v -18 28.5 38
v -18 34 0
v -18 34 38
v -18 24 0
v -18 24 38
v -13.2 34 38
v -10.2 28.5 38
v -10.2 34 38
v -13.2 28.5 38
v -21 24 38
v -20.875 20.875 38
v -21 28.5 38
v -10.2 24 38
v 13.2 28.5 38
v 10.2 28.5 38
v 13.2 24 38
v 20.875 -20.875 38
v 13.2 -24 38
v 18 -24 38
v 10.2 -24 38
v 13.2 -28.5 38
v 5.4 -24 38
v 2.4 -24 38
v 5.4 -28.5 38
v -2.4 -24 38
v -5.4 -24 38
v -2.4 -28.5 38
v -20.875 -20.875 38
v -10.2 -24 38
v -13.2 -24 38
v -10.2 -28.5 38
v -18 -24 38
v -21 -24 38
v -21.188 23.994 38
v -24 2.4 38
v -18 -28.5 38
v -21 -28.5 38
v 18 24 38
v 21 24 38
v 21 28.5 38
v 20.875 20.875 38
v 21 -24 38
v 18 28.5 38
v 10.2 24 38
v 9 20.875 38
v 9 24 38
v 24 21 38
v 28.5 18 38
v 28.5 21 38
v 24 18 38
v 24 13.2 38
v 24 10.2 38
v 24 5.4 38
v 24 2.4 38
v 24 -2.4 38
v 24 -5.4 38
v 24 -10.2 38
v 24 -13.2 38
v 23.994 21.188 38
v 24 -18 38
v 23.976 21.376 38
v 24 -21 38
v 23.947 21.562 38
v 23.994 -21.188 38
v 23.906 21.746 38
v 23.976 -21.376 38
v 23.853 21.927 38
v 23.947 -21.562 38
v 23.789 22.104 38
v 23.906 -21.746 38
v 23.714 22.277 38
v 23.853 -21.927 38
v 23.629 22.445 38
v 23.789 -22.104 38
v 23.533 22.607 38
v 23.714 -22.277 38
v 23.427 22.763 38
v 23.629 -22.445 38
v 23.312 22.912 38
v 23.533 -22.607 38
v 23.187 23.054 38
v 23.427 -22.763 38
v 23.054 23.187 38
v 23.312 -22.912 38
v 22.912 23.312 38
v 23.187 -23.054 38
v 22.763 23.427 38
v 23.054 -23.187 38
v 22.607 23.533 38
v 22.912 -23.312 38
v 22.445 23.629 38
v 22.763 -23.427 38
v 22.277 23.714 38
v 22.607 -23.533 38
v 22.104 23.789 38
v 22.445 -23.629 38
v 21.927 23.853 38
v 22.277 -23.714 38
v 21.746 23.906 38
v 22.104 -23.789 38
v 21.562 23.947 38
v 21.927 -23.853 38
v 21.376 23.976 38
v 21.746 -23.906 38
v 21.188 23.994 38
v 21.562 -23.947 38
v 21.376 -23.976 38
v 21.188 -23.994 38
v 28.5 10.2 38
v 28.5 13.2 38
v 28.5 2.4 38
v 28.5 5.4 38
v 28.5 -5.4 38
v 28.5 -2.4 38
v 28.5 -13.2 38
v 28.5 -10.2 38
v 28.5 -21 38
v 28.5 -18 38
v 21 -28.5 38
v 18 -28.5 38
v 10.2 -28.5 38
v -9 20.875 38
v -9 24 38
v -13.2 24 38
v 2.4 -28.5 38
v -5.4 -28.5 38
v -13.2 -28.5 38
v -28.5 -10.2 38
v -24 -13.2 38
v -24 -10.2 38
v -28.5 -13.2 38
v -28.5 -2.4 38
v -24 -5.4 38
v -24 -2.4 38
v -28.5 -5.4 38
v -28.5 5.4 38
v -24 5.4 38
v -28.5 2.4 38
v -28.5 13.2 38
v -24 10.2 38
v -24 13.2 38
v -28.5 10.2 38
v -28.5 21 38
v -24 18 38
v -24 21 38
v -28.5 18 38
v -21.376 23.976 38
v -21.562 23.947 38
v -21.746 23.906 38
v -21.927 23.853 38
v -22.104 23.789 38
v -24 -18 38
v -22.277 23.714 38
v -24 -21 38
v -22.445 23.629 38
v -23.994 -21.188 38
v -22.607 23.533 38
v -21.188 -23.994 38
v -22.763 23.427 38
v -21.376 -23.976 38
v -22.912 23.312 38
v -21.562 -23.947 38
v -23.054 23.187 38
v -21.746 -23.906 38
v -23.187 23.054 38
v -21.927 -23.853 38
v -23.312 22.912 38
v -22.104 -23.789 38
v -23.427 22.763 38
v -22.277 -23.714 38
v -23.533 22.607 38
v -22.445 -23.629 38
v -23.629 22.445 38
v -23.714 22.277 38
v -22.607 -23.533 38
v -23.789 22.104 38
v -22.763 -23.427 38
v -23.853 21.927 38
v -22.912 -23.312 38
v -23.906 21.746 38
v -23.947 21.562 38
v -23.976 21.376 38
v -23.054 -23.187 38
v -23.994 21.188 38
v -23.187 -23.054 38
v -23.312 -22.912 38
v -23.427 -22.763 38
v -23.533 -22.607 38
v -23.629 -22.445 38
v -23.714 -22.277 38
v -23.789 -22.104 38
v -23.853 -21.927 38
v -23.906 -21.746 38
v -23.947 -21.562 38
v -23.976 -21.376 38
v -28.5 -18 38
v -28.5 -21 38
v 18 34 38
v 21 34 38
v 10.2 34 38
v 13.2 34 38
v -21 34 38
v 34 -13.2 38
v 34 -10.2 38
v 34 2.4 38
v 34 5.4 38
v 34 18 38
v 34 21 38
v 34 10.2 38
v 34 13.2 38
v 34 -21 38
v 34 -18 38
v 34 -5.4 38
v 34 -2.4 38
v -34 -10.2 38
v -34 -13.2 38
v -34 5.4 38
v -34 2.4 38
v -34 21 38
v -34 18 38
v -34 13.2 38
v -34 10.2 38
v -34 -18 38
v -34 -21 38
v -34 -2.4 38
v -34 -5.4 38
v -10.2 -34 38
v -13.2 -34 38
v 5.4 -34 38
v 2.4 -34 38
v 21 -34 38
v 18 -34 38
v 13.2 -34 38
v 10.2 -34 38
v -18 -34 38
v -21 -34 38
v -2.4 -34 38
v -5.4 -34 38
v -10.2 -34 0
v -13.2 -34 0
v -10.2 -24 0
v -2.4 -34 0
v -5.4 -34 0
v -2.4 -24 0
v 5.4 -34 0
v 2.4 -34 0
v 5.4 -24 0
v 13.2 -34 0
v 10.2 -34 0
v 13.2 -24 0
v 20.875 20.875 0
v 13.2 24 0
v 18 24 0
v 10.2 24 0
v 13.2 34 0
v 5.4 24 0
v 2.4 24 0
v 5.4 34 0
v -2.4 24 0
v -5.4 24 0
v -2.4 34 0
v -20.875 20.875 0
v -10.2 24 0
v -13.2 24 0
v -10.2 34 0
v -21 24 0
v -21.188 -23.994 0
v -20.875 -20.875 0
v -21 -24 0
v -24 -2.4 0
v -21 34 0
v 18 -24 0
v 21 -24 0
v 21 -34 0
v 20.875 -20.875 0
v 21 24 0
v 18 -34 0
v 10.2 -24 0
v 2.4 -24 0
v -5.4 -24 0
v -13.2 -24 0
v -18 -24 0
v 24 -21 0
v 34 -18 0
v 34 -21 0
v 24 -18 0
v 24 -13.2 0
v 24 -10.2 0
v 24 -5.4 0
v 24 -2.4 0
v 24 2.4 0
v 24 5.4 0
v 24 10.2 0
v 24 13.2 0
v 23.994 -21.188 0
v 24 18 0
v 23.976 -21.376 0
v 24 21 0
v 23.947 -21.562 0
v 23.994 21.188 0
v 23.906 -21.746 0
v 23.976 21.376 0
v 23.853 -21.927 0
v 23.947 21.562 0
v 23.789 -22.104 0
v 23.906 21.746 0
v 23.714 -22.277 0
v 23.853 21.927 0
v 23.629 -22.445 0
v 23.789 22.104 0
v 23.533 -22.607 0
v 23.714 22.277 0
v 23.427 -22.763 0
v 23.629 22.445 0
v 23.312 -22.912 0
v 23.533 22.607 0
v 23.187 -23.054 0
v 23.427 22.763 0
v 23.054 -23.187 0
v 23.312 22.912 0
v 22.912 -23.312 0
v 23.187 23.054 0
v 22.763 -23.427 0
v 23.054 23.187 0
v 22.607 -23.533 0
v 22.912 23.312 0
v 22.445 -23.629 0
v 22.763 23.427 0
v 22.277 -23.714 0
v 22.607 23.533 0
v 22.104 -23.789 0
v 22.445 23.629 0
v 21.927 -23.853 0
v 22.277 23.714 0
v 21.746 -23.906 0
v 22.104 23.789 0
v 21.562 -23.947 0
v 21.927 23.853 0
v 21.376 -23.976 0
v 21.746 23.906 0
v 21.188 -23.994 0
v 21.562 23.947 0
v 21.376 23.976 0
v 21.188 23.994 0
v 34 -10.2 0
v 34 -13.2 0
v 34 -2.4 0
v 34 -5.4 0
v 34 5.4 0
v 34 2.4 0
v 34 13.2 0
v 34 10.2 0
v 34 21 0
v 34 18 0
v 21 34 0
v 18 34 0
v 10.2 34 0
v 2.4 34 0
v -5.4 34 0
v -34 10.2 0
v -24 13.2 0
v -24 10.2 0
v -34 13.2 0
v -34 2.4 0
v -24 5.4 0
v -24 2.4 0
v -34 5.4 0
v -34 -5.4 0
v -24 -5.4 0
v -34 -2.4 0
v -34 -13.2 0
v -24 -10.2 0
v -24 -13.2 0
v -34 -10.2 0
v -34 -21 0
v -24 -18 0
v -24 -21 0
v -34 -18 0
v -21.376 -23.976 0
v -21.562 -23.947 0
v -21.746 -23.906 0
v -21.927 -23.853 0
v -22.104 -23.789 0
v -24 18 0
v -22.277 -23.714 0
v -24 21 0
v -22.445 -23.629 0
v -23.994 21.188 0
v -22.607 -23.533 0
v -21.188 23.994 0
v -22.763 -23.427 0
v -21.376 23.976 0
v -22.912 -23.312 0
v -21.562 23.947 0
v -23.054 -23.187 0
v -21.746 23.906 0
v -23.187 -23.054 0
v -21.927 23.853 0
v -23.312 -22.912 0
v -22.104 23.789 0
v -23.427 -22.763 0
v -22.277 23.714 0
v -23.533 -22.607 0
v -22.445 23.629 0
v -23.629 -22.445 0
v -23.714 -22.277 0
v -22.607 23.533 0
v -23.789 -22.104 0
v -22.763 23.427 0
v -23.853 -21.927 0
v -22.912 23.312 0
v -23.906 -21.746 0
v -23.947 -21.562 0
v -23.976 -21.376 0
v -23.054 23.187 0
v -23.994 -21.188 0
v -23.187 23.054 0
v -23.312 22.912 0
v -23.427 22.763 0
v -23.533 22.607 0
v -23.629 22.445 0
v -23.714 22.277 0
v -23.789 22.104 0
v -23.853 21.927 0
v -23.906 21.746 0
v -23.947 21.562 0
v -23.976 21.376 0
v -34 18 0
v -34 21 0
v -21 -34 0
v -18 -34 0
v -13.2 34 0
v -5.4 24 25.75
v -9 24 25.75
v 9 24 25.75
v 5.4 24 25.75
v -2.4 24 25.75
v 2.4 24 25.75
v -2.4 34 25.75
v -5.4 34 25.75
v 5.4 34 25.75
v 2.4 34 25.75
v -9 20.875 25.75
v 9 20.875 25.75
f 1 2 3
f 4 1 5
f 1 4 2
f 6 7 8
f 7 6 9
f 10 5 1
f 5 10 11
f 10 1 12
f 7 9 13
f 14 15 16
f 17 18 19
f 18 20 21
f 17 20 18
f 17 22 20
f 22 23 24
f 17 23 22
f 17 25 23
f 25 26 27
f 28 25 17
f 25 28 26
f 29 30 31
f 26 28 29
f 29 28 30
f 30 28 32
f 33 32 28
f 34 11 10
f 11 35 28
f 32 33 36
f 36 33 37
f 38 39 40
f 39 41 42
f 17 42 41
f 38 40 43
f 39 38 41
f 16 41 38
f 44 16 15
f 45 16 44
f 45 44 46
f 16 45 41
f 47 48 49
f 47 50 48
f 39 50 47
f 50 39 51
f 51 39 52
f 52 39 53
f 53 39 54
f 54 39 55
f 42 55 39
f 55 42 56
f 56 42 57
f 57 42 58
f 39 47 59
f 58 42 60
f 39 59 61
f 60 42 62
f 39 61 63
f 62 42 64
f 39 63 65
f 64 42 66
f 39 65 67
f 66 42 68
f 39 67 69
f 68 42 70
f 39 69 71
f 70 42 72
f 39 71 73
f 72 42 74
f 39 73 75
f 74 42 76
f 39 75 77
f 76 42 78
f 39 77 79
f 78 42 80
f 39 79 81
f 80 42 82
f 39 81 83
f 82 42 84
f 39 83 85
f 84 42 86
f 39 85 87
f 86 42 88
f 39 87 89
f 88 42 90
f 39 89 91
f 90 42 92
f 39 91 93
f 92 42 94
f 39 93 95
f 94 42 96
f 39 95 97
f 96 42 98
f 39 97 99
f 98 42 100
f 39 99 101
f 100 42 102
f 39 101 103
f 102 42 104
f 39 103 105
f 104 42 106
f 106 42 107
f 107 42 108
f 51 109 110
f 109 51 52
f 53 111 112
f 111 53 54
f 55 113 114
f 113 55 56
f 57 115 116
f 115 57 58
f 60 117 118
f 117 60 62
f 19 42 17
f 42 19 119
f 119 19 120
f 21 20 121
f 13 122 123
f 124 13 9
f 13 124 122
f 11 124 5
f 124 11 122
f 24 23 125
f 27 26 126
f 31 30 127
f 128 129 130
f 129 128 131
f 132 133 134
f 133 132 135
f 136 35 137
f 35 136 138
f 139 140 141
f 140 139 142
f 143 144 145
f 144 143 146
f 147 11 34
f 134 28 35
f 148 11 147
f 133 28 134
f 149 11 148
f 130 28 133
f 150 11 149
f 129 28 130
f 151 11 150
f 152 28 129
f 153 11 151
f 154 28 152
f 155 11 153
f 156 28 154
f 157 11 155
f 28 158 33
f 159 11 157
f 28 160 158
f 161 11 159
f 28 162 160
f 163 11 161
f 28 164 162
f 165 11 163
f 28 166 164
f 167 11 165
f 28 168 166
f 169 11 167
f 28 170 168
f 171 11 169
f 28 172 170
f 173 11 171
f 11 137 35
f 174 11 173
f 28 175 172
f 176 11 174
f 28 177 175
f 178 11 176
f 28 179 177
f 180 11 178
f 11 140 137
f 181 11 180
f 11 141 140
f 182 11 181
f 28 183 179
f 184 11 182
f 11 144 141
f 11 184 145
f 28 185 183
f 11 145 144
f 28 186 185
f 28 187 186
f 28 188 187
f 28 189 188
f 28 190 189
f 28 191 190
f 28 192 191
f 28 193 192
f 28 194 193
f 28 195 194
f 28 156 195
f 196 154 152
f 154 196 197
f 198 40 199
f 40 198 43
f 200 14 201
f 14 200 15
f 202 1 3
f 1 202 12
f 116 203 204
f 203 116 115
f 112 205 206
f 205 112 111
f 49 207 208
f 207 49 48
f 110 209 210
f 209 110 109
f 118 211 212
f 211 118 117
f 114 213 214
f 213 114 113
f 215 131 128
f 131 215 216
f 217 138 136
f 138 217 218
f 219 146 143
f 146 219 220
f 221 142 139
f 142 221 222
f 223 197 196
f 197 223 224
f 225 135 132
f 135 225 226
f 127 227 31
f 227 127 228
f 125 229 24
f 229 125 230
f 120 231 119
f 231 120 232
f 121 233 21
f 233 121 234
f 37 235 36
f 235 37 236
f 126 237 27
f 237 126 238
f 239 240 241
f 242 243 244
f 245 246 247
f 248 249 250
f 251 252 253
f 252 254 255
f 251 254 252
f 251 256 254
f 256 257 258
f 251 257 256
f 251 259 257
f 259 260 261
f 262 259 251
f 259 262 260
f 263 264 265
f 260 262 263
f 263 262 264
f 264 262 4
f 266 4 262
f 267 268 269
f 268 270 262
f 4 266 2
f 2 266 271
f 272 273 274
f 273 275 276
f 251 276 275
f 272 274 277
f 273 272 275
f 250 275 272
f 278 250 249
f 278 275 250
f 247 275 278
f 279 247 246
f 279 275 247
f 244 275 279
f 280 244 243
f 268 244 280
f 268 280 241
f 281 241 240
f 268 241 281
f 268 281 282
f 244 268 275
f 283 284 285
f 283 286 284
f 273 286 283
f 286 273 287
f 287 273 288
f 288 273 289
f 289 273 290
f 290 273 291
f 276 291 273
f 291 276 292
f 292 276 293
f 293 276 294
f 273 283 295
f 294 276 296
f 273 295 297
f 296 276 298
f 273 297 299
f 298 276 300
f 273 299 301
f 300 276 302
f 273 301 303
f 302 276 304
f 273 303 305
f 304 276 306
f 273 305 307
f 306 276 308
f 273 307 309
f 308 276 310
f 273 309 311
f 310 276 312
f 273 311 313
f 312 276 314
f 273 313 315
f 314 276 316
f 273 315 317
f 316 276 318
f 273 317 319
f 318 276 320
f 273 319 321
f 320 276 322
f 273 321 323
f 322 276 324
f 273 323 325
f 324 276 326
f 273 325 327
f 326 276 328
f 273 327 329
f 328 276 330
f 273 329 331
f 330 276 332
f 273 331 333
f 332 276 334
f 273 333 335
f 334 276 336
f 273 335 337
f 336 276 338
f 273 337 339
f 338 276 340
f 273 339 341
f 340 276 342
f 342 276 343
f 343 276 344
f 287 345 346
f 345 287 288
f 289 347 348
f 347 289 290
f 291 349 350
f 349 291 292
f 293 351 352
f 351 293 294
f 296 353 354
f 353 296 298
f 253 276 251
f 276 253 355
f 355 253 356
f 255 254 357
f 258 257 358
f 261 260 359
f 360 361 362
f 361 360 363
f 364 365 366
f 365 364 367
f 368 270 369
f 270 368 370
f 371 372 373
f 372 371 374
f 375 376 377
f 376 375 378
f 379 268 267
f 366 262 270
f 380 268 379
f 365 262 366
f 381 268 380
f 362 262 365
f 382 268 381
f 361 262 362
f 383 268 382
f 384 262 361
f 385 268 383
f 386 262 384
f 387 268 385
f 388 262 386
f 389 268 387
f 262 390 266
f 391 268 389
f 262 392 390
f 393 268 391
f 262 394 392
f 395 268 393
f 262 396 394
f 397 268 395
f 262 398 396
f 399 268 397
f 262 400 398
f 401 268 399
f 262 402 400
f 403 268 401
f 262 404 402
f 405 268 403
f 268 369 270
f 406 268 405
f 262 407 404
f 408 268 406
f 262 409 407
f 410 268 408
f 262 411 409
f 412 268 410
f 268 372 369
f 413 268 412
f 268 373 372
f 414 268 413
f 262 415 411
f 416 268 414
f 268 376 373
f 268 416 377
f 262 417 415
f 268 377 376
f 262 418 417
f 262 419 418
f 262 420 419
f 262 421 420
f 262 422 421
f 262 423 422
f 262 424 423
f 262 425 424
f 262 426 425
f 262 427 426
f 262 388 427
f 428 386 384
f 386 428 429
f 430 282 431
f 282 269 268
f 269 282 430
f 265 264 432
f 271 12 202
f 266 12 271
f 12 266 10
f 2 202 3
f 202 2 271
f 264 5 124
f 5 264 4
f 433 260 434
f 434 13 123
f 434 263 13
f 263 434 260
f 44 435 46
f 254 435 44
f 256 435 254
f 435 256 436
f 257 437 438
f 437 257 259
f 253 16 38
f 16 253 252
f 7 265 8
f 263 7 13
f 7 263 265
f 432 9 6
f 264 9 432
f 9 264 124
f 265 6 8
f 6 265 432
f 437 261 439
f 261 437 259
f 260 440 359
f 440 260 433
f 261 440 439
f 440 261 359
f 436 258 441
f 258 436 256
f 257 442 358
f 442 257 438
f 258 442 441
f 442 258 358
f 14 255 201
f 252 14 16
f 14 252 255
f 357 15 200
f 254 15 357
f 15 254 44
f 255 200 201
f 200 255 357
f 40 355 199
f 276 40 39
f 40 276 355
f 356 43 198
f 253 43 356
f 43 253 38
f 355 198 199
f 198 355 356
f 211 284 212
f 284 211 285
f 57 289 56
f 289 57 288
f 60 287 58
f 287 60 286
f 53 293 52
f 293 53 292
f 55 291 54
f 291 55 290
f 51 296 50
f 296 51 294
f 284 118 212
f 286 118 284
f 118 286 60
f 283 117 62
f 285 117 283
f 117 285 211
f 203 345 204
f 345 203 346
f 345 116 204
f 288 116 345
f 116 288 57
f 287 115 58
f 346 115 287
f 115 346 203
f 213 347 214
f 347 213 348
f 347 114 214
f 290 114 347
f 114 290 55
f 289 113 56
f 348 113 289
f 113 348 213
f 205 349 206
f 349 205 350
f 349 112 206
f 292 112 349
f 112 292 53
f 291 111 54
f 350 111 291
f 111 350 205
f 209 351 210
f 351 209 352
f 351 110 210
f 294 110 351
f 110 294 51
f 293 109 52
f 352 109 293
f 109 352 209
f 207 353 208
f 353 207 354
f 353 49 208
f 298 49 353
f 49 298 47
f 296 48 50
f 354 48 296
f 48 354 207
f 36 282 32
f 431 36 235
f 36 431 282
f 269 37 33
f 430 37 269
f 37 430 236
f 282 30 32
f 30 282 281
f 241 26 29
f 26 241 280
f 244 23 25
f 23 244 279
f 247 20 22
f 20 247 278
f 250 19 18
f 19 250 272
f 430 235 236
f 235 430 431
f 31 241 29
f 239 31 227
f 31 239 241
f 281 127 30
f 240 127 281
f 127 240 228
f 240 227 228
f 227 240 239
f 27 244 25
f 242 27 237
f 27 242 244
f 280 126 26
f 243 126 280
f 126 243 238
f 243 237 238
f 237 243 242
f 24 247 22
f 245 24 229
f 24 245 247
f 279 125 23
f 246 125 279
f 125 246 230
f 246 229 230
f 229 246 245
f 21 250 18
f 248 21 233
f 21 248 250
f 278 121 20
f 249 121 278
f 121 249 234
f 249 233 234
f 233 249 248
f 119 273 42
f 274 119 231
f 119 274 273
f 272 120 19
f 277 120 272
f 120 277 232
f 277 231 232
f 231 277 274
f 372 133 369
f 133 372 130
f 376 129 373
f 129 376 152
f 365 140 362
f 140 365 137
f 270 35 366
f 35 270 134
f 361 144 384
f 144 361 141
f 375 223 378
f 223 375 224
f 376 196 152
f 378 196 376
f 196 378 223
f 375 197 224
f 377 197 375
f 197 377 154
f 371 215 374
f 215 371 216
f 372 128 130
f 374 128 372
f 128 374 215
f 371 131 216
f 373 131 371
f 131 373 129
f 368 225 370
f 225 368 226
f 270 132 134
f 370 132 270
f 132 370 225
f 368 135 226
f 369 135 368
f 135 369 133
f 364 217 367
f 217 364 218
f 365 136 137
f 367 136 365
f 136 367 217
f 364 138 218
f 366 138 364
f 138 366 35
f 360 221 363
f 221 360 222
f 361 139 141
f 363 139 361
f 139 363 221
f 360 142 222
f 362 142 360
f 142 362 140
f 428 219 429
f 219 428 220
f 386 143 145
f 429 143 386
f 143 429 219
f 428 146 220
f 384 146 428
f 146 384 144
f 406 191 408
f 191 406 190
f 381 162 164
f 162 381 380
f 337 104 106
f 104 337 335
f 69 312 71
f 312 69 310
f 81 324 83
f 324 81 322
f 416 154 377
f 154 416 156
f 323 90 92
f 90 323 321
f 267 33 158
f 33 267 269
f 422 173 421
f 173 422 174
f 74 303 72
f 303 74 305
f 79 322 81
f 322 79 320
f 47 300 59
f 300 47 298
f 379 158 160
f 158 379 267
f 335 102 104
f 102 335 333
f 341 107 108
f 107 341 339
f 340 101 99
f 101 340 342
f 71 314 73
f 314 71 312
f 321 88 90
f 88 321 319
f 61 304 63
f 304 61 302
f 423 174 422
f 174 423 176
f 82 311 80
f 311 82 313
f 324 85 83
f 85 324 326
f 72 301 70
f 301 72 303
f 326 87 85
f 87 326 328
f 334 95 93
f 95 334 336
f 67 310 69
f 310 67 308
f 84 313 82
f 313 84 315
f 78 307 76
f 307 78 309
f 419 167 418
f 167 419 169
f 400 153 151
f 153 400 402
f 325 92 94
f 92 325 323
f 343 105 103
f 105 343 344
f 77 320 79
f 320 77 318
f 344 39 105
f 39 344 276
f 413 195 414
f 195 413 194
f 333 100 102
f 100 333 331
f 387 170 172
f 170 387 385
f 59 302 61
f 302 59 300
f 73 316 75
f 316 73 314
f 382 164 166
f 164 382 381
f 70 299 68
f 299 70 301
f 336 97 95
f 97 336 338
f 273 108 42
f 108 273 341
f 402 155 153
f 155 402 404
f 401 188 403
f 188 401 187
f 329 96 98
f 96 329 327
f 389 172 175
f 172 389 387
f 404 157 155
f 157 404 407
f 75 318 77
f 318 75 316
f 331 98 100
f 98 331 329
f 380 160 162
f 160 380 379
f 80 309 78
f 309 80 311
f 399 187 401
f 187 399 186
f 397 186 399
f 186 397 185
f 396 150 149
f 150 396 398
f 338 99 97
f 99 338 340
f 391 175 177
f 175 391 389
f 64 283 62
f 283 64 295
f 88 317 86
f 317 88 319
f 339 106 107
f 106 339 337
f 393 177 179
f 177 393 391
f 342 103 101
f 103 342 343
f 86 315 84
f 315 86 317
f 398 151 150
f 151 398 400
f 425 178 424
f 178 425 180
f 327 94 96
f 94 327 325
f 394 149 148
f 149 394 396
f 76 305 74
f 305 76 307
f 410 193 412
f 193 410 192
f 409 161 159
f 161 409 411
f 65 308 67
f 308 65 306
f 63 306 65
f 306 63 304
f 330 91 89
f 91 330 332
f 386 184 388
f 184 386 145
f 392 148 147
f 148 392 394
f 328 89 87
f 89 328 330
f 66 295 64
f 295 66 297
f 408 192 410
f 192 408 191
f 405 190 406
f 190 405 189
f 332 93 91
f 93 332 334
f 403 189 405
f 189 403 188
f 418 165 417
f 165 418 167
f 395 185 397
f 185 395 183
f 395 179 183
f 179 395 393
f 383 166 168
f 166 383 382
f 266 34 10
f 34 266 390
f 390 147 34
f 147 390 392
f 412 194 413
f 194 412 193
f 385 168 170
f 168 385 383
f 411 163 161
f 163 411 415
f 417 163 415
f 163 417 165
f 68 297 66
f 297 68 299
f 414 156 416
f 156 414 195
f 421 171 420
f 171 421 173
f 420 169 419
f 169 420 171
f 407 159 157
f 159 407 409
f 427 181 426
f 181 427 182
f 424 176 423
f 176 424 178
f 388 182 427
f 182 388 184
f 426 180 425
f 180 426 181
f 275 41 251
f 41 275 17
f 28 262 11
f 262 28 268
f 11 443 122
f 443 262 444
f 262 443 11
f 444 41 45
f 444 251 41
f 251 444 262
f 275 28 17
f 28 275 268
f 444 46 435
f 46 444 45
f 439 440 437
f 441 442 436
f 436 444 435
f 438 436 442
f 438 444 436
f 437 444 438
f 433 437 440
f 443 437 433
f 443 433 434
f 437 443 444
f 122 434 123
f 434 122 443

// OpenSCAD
// Stepper Motor Heatsink by Gregory L Holloway.
// @greg_the_maker
// 2019 - CC-BY-SA | https://creativecommons.org/licenses/by-sa/4.0/
// All measurements are in mm.
// https://www.thingiverse.com/thing:3663009

/* [Global] */

// mm
Motor_Body_Width = 42;

// mm
Motor_Body_Length = 38;

// mm
Housing_Thickness = 3;

Fins_On_Side_1 = 1; // [1:Yes,0:No]

Fins_On_Side_2 = 1; // [1:Yes,0:No]

Fins_On_Side_3 = 1; // [1:Yes,0:No]

Fins_On_Side_4 = 1; // [1:Yes,0:No]

Number_Of_Fins_Per_Side = 6;

// mm
Fin_Thickness = 3;

// mm
Fin_Length = 10;

// Cut-Out the Motor Cable Socket or cables.
Cable_Gap = 1; // [1:Yes,0:No]

// mm
Cable_Width = 18;

// mm
Cable_Height = 12;

// mm
Body_Undersize = 0.125;

/* [Hidden] */

heatsink (Motor_Body_Width,Motor_Body_Length,Fins_On_Side_1,Fins_On_Side_2,Fins_On_Side_3,Fins_On_Side_4,Cable_Gap,Number_Of_Fins_Per_Side,Housing_Thickness,Fin_Thickness,Fin_Length,Cable_Width,Cable_Height,Body_Undersize);

module heatsink (Fin_Spacing)
{
    // resolution
    $fn = 100; // Does not effect the STL
    
    // Calculations
    Fin_Spacing = (Motor_Body_Width/(Number_Of_Fins_Per_Side-1))-(Fin_Thickness/(Number_Of_Fins_Per_Side-1));

    // start objects
    
    // housing
    difference(){
              
        union(){
            minkowski(){
            translate([0,0,Motor_Body_Length/2])
            cube([Motor_Body_Width,Motor_Body_Width,Motor_Body_Length],true);
            cylinder(r=Housing_Thickness,h=Motor_Body_Length);
            }
        //fins side 1
        if (Fins_On_Side_1==1){
        for(Fins = [0:Number_Of_Fins_Per_Side-1]){     
            translate ([(Fin_Spacing*Fins)-(Motor_Body_Width/2),Motor_Body_Width/2+Housing_Thickness,0])
            cube([Fin_Thickness,Fin_Length,Motor_Body_Length], false);    
            }
        }

        //fins side 2
        if (Fins_On_Side_2==1){
        for(Fins = [0:Number_Of_Fins_Per_Side-1]){     
            translate ([Motor_Body_Width/2+Housing_Thickness,(Fin_Spacing*Fins)-(Motor_Body_Width/2),0])
            cube([Fin_Length,Fin_Thickness,Motor_Body_Length], false);    
            }
        }

        //fins side 3
        if (Fins_On_Side_3==1){
        for(Fins = [0:Number_Of_Fins_Per_Side-1]){
            translate ([(Fin_Spacing*Fins)-(Motor_Body_Width/2),-Motor_Body_Width/2-Housing_Thickness-Fin_Length,0])
            cube([Fin_Thickness,Fin_Length,Motor_Body_Length], false);    
            }   
        }
    
        //fins side 4
        if (Fins_On_Side_4==1){
        for(Fins = [0:Number_Of_Fins_Per_Side-1]){     
            translate ([-Motor_Body_Width/2-Housing_Thickness-Fin_Length,(Fin_Spacing*Fins)-(Motor_Body_Width/2),0])
            cube([Fin_Length,Fin_Thickness,Motor_Body_Length], false);    
            }   
        }
    }
    
    translate([0,0,Motor_Body_Length/2])
    cube([Motor_Body_Width-(Body_Undersize*2),Motor_Body_Width-(Body_Undersize*2),Motor_Body_Length+4],true);
    
    // Cable Cutout
    if (Cable_Gap==1){
        translate([0,Motor_Body_Width/2+Housing_Thickness/2,Motor_Body_Length-Cable_Height/2])
        cube([Cable_Width,Cable_Height*4,Cable_Height+0.5], true);
    }
    
    //dirty hax.
    translate([0,0,(Motor_Body_Length*1.5+2.5)])
    cube([Motor_Body_Width+15,Motor_Body_Width+15,Motor_Body_Length+5],true);
    }
}
